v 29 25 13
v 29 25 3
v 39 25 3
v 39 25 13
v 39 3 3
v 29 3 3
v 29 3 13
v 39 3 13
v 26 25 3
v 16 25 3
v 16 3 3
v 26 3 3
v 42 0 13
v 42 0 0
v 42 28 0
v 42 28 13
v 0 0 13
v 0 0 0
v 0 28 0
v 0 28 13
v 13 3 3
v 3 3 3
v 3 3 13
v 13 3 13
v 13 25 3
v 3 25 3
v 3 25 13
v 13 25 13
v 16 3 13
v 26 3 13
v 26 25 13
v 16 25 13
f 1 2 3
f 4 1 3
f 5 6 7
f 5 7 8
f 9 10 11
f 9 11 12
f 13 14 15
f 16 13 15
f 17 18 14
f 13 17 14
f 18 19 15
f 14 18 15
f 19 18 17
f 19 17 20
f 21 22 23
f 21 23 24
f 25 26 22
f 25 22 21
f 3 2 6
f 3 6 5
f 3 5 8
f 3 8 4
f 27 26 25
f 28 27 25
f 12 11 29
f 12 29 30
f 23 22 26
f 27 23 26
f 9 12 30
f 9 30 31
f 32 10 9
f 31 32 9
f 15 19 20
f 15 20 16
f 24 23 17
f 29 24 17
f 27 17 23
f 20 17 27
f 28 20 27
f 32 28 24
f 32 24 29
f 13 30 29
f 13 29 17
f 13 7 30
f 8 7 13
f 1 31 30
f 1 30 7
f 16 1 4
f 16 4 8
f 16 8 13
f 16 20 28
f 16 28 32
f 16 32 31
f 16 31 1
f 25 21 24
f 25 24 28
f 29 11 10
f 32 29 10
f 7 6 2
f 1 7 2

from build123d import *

# Parameters (mm, degrees)
BOX004_W     = 10
BOX004_H     = 22
BOX004_DEPTH = 10
BOX003_W     = 10
BOX003_H     = 22
BOX003_DEPTH = 10
BOX002_W     = 10
BOX002_H     = 22
BOX002_DEPTH = 10
BOX001_W     = 42
BOX001_H     = 28
BOX001_DEPTH = 13


with BuildPart() as cubo003:
    # Box004 → Box004 (new body)
    with BuildSketch(Plane(origin=(29, 3, 3), x_dir=(1, 0, 0), z_dir=(0, 0, 1))):
        with Locations((5, 11)):
            Rectangle(BOX004_W, BOX004_H)
    extrude(amount=BOX004_DEPTH)


with BuildPart() as cubo002:
    # Box003 → Box003 (new body)
    with BuildSketch(Plane(origin=(16, 3, 3), x_dir=(1, 0, 0), z_dir=(0, 0, 1))):
        with Locations((5, 11)):
            Rectangle(BOX003_W, BOX003_H)
    extrude(amount=BOX003_DEPTH)


with BuildPart() as cubo001:
    # Box002 → Box002 (new body)
    with BuildSketch(Plane(origin=(3, 3, 3), x_dir=(1, 0, 0), z_dir=(0, 0, 1))):
        with Locations((5, 11)):
            Rectangle(BOX002_W, BOX002_H)
    extrude(amount=BOX002_DEPTH)


with BuildPart() as cut002:
    # Box001 → Box001 (new body)
    with BuildSketch(Plane.XY):
        with Locations((21, 14)):
            Rectangle(BOX001_W, BOX001_H)
    extrude(amount=BOX001_DEPTH)

    # Cut: cut Cubo001
    add(cubo001.part, mode=Mode.SUBTRACT)

    # Cut001: cut Cubo002
    add(cubo002.part, mode=Mode.SUBTRACT)

    # Cut002: cut Cubo003
    add(cubo003.part, mode=Mode.SUBTRACT)


solid = cut002.part
